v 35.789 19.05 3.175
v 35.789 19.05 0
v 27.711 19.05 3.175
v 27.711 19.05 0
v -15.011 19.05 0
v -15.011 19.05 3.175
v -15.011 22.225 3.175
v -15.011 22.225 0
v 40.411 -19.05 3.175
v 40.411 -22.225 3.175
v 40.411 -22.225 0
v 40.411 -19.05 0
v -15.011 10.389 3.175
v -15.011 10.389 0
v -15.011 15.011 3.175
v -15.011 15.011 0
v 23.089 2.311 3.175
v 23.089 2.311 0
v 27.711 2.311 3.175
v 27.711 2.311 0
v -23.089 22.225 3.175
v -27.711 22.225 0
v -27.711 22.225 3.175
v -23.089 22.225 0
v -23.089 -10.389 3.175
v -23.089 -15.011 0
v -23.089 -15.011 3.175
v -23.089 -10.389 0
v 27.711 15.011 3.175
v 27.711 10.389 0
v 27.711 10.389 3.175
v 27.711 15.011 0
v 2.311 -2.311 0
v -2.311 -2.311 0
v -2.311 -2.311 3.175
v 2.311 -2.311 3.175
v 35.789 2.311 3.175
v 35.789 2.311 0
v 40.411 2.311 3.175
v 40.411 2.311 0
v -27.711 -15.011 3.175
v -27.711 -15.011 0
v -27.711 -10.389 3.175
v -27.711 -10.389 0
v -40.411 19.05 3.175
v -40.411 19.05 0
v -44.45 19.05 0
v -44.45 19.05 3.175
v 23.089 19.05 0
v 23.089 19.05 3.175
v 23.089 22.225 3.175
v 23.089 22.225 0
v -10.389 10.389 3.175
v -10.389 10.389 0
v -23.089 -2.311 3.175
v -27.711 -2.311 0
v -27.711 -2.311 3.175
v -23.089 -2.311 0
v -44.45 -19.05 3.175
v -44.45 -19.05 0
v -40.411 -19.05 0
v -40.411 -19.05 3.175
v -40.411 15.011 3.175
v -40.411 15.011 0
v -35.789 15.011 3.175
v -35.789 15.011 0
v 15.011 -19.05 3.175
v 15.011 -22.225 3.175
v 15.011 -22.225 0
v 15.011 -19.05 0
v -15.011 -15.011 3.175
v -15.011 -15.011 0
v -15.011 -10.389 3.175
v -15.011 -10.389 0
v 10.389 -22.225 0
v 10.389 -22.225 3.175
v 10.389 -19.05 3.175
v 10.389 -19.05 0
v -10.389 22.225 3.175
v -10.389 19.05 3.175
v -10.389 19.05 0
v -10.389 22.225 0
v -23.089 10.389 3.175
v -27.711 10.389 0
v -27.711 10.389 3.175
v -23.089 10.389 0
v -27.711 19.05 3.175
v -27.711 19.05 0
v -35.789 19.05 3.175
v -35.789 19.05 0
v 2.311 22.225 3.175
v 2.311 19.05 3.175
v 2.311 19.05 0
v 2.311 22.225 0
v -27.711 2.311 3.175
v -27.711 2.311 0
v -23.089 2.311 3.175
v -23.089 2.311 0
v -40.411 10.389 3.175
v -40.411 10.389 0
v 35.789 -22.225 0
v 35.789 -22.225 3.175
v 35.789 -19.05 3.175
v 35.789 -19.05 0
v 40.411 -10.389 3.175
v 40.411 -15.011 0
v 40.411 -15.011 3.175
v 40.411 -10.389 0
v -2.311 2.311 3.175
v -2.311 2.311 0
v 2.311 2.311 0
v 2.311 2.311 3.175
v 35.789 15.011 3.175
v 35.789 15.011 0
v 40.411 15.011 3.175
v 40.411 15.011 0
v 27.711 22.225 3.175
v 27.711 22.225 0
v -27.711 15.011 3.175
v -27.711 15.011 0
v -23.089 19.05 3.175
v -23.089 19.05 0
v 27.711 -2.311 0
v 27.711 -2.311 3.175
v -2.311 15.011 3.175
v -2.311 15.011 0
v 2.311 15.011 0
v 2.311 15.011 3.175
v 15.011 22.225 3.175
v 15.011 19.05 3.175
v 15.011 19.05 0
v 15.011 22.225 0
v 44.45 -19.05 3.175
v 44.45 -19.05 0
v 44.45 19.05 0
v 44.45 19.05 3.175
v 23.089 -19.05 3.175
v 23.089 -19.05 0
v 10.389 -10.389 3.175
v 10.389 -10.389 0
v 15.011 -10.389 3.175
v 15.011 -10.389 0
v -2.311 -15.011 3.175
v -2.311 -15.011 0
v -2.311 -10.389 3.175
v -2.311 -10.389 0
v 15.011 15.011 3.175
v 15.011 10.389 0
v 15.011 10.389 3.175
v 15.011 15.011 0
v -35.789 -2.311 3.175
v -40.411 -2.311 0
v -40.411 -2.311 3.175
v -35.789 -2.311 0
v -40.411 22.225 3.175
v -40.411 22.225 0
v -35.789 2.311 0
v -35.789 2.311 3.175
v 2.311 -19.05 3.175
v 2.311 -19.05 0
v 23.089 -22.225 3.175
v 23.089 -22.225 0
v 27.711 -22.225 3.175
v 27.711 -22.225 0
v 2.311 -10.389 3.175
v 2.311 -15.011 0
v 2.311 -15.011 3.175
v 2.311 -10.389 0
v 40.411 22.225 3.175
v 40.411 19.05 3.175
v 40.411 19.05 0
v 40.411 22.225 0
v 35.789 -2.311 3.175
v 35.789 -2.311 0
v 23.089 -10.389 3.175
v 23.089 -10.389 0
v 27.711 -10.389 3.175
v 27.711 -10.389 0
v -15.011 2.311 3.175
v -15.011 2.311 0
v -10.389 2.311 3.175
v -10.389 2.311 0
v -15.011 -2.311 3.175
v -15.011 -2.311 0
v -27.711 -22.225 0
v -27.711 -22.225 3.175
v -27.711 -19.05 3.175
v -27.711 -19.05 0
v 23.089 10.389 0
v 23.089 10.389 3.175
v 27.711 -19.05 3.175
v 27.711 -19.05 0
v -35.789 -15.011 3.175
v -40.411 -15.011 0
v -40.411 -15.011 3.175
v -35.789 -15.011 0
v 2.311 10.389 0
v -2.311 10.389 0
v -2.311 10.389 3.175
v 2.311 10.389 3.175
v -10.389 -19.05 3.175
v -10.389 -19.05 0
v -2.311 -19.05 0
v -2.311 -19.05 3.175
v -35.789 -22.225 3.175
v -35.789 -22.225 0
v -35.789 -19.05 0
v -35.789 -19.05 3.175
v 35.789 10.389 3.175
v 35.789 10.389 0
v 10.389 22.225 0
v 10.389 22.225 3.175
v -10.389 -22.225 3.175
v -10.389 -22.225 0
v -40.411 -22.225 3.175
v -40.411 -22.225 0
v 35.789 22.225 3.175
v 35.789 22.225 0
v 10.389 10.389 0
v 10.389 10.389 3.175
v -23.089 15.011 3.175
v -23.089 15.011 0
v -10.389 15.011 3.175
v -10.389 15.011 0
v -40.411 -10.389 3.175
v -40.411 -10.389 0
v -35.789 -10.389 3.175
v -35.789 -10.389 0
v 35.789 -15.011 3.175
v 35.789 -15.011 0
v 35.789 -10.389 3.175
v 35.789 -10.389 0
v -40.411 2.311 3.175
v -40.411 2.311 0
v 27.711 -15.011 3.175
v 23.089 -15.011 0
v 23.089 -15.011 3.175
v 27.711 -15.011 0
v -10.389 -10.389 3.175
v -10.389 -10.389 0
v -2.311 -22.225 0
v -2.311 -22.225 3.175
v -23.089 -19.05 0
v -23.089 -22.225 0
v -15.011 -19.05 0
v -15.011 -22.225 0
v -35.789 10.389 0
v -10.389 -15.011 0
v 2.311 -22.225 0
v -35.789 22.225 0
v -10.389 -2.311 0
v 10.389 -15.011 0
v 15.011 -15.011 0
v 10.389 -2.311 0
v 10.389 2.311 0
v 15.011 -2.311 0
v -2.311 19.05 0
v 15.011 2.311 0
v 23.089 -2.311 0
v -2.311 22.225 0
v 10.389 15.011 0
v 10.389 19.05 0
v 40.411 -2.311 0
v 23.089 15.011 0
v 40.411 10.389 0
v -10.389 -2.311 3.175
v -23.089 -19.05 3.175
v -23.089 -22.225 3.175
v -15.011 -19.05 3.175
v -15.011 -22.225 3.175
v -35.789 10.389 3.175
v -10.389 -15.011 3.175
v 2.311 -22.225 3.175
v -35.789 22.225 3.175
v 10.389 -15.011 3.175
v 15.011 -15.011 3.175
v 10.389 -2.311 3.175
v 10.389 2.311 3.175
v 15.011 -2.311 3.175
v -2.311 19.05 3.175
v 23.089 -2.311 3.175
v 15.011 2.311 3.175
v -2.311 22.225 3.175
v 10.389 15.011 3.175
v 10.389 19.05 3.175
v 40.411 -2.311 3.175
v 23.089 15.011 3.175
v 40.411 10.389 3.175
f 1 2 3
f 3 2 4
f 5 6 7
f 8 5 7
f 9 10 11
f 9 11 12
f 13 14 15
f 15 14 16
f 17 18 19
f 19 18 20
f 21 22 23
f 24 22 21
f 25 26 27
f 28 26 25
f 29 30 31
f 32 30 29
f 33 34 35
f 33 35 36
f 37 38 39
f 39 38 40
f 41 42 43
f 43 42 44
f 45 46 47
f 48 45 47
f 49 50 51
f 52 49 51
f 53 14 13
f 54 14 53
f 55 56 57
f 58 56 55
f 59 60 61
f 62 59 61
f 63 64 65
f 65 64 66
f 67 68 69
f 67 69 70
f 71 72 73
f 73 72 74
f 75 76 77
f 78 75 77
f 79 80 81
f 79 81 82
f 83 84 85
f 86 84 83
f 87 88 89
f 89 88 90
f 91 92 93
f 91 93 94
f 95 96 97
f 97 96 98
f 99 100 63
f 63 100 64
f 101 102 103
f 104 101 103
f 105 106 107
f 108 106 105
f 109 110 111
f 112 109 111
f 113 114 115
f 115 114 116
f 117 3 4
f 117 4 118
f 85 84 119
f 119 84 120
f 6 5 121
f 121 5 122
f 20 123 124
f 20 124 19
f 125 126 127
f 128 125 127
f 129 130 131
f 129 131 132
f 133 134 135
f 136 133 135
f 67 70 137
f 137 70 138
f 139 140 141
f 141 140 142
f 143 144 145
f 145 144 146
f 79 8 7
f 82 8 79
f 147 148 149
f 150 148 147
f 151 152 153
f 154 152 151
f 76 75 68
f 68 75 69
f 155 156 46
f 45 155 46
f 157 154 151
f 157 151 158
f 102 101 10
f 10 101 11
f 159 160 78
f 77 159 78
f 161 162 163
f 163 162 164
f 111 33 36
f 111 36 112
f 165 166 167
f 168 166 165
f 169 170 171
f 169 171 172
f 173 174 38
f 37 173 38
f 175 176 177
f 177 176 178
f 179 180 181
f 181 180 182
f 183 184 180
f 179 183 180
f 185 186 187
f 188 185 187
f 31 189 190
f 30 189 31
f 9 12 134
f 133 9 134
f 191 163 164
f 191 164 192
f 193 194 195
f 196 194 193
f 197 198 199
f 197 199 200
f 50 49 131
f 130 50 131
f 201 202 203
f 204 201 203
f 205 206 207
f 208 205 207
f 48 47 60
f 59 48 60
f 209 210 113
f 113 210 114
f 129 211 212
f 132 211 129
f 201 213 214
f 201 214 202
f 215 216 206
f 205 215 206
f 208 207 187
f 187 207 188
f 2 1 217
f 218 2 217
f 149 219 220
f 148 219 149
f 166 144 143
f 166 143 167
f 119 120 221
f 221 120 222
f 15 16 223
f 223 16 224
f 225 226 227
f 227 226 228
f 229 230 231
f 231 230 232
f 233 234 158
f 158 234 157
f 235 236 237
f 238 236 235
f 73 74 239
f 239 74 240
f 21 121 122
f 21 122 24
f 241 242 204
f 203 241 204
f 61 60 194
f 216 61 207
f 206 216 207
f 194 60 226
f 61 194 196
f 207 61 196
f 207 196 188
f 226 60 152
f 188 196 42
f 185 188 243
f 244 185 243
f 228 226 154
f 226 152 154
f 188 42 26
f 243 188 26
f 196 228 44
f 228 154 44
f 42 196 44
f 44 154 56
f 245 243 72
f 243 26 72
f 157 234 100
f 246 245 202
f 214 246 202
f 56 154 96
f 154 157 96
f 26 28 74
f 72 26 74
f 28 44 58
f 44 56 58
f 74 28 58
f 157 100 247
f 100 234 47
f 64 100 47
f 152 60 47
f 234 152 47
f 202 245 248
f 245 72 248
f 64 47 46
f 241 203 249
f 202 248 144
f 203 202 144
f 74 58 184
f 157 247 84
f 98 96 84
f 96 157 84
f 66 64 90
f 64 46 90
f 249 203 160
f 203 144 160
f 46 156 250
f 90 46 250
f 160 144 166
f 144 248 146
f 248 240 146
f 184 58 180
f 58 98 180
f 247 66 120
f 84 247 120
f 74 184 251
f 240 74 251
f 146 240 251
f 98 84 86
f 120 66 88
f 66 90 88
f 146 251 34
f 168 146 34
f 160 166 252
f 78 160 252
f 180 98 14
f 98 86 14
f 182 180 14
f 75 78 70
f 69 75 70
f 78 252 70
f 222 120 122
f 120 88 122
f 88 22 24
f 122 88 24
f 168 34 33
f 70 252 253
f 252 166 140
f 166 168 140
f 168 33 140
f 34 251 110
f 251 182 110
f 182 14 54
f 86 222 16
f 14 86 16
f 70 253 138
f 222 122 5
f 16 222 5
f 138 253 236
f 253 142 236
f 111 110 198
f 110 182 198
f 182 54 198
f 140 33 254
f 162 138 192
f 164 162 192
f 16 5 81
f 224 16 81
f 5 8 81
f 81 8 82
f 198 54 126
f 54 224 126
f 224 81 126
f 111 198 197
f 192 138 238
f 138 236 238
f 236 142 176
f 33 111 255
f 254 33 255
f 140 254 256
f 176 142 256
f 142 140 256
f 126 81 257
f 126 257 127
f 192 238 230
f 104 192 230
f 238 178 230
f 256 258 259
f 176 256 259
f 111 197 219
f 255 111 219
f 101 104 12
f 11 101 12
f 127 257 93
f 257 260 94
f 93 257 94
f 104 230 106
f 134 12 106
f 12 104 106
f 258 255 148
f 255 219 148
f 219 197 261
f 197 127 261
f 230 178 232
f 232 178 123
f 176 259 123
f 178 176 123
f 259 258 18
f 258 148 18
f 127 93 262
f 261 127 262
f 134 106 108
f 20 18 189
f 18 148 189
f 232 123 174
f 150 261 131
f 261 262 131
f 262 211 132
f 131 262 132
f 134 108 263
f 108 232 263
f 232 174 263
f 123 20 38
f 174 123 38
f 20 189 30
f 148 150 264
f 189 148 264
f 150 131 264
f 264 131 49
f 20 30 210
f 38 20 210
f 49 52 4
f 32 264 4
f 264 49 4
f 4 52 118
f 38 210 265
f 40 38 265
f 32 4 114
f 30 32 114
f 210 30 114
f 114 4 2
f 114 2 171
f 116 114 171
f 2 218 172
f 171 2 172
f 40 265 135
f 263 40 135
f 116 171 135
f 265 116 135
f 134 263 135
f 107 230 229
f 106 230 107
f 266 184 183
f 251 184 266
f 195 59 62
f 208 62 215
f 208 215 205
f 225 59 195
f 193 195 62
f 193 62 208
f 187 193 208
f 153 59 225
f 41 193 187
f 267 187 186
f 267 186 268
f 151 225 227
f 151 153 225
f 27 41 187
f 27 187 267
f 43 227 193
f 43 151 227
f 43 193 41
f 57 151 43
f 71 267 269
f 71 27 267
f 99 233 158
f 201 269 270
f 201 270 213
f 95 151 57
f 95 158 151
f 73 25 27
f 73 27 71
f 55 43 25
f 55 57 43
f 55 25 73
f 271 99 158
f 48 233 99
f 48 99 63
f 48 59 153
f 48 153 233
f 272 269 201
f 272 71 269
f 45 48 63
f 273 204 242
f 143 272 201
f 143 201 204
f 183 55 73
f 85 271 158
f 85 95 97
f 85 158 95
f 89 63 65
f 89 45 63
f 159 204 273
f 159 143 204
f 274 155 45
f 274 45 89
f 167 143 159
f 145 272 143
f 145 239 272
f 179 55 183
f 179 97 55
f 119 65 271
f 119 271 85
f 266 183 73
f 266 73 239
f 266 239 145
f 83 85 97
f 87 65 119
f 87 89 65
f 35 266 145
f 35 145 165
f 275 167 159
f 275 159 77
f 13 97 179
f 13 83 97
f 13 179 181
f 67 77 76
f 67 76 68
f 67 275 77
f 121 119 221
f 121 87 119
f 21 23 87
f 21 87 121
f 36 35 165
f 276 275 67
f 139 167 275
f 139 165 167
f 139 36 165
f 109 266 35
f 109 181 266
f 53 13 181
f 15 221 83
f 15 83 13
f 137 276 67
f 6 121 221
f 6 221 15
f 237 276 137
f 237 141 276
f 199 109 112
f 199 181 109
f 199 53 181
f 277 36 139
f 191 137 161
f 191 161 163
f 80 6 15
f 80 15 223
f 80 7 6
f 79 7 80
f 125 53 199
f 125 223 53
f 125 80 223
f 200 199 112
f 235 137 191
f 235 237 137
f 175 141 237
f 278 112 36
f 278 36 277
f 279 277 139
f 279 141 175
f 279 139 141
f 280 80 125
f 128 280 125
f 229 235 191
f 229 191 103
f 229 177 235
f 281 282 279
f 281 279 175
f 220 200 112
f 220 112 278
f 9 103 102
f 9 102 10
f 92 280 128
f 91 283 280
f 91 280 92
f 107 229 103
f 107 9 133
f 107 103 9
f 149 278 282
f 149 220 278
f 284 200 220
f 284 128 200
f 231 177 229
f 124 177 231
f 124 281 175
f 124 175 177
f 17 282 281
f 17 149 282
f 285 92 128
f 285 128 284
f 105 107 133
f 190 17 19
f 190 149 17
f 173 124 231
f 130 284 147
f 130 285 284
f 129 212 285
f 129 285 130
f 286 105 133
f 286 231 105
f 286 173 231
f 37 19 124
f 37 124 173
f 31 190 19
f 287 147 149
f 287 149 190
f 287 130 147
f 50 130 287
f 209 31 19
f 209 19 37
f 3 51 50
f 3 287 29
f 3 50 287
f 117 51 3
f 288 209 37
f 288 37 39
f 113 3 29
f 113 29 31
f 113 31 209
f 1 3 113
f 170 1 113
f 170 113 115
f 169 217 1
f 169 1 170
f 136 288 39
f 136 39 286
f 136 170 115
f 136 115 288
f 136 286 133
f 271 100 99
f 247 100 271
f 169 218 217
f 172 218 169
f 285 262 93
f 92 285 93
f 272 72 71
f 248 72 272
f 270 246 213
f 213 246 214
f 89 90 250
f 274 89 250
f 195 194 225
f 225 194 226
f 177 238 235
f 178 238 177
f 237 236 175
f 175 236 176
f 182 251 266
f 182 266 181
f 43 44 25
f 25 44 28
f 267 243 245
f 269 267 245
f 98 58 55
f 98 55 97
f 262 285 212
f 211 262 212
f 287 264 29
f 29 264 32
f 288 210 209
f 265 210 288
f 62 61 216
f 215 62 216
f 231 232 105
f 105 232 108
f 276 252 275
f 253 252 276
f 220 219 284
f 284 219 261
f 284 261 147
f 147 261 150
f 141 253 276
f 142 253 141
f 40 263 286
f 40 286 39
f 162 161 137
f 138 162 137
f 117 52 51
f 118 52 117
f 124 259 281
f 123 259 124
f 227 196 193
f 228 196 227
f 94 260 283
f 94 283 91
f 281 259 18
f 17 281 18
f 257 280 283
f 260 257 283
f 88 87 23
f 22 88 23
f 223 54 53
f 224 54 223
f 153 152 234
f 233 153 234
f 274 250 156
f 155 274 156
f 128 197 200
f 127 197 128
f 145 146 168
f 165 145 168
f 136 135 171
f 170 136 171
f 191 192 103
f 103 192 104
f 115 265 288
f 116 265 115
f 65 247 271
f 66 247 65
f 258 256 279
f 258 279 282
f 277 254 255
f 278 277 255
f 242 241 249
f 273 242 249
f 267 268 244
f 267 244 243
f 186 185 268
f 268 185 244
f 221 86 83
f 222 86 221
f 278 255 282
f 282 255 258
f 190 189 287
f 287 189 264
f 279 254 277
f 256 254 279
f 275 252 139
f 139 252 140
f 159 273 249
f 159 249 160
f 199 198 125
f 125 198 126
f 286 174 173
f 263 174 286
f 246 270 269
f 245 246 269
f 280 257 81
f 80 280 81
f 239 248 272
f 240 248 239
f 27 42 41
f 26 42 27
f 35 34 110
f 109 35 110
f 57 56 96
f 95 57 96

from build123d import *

# Parameters (mm, degrees)
F0_W     = 4.6228
F0_H     = 4.6228
F0_H_2   = 3.175
F1_DEPTH = 3.175


with BuildPart() as f1:
    # F0 (on Top) → F1 (new body)
    with BuildSketch(Plane.XY):
        Polygon((44.45, -19.05), (44.45, 19.05), (40.4114, 19.05), (35.7886, 19.05), (27.7114, 19.05), (23.0886, 19.05), (15.0114, 19.05), (10.3886, 19.05), (2.3114, 19.05), (-2.3114, 19.05), (-10.3886, 19.05), (-15.0114, 19.05), (-23.0886, 19.05), (-27.7114, 19.05), (-35.7886, 19.05), (-38.1, 19.05), (-40.4114, 19.05), (-44.45, 19.05), (-44.45, -12.7), (-44.45, -19.05), (-40.4114, -19.05), (-38.1, -19.05), (-35.7886, -19.05), (-27.7114, -19.05), (-23.0886, -19.05), (-15.0114, -19.05), (-10.3886, -19.05), (-2.3114, -19.05), (2.3114, -19.05), (10.3886, -19.05), (15.0114, -19.05), (23.0886, -19.05), (27.7114, -19.05), (35.7886, -19.05), (40.4114, -19.05), align=None)
        with Locations((-38.1, -12.7)):
            Rectangle(F0_W, F0_H, mode=Mode.SUBTRACT)
        with Locations((-25.4, -12.7)):
            Rectangle(F0_W, F0_H, mode=Mode.SUBTRACT)
        with Locations((-12.7, -12.7)):
            Rectangle(F0_W, F0_H, mode=Mode.SUBTRACT)
        with Locations((0, -12.7)):
            Rectangle(F0_W, F0_H, mode=Mode.SUBTRACT)
        with Locations((12.7, -12.7)):
            Rectangle(F0_W, F0_H, mode=Mode.SUBTRACT)
        with Locations((25.4, -12.7)):
            Rectangle(F0_W, F0_H, mode=Mode.SUBTRACT)
        with Locations((38.1, -12.7)):
            Rectangle(F0_W, F0_H, mode=Mode.SUBTRACT)
        with Locations((-38.1, 0)):
            Rectangle(F0_W, F0_H, mode=Mode.SUBTRACT)
        with Locations((-25.4, 0)):
            Rectangle(F0_W, F0_H, mode=Mode.SUBTRACT)
        with Locations((-12.7, 0)):
            Rectangle(F0_W, F0_H, mode=Mode.SUBTRACT)
        with Locations((-38.1, 12.7)):
            Rectangle(F0_W, F0_H, mode=Mode.SUBTRACT)
        with Locations((-25.4, 12.7)):
            Rectangle(F0_W, F0_H, mode=Mode.SUBTRACT)
        with Locations((-12.7, 12.7)):
            Rectangle(F0_W, F0_H, mode=Mode.SUBTRACT)
        Rectangle(F0_W, F0_H, mode=Mode.SUBTRACT)
        with Locations((12.7, 0)):
            Rectangle(F0_W, F0_H, mode=Mode.SUBTRACT)
        with Locations((25.4, 0)):
            Rectangle(F0_W, F0_H, mode=Mode.SUBTRACT)
        with Locations((38.1, 0)):
            Rectangle(F0_W, F0_H, mode=Mode.SUBTRACT)
        with Locations((0, 12.7)):
            Rectangle(F0_W, F0_H, mode=Mode.SUBTRACT)
        with Locations((12.7, 12.7)):
            Rectangle(F0_W, F0_H, mode=Mode.SUBTRACT)
        with Locations((25.4, 12.7)):
            Rectangle(F0_W, F0_H, mode=Mode.SUBTRACT)
        with Locations((38.1, 12.7)):
            Rectangle(F0_W, F0_H, mode=Mode.SUBTRACT)
        with Locations((38.1, 20.6375)):
            Rectangle(F0_W, F0_H_2)
        with Locations((38.1, -20.6375)):
            Rectangle(F0_W, F0_H_2)
        with Locations((25.4, 20.6375)):
            Rectangle(F0_W, F0_H_2)
        with Locations((25.4, -20.6375)):
            Rectangle(F0_W, F0_H_2)
        with Locations((12.7, 20.6375)):
            Rectangle(F0_W, F0_H_2)
        with Locations((12.7, -20.6375)):
            Rectangle(F0_W, F0_H_2)
        with Locations((0, 20.6375)):
            Rectangle(F0_W, F0_H_2)
        with Locations((0, -20.6375)):
            Rectangle(F0_W, F0_H_2)
        with Locations((-12.7, 20.6375)):
            Rectangle(F0_W, F0_H_2)
        with Locations((-12.7, -20.6375)):
            Rectangle(F0_W, F0_H_2)
        with Locations((-25.4, 20.6375)):
            Rectangle(F0_W, F0_H_2)
        with Locations((-25.4, -20.6375)):
            Rectangle(F0_W, F0_H_2)
        Polygon((-38.1, 19.05), (-35.7886, 19.05), (-35.7886, 22.225), (-40.4114, 22.225), (-40.4114, 19.05), align=None)
        Polygon((-35.7886, -22.225), (-35.7886, -19.05), (-38.1, -19.05), (-40.4114, -19.05), (-40.4114, -22.225), align=None)
    extrude(amount=F1_DEPTH)


solid = f1.part
